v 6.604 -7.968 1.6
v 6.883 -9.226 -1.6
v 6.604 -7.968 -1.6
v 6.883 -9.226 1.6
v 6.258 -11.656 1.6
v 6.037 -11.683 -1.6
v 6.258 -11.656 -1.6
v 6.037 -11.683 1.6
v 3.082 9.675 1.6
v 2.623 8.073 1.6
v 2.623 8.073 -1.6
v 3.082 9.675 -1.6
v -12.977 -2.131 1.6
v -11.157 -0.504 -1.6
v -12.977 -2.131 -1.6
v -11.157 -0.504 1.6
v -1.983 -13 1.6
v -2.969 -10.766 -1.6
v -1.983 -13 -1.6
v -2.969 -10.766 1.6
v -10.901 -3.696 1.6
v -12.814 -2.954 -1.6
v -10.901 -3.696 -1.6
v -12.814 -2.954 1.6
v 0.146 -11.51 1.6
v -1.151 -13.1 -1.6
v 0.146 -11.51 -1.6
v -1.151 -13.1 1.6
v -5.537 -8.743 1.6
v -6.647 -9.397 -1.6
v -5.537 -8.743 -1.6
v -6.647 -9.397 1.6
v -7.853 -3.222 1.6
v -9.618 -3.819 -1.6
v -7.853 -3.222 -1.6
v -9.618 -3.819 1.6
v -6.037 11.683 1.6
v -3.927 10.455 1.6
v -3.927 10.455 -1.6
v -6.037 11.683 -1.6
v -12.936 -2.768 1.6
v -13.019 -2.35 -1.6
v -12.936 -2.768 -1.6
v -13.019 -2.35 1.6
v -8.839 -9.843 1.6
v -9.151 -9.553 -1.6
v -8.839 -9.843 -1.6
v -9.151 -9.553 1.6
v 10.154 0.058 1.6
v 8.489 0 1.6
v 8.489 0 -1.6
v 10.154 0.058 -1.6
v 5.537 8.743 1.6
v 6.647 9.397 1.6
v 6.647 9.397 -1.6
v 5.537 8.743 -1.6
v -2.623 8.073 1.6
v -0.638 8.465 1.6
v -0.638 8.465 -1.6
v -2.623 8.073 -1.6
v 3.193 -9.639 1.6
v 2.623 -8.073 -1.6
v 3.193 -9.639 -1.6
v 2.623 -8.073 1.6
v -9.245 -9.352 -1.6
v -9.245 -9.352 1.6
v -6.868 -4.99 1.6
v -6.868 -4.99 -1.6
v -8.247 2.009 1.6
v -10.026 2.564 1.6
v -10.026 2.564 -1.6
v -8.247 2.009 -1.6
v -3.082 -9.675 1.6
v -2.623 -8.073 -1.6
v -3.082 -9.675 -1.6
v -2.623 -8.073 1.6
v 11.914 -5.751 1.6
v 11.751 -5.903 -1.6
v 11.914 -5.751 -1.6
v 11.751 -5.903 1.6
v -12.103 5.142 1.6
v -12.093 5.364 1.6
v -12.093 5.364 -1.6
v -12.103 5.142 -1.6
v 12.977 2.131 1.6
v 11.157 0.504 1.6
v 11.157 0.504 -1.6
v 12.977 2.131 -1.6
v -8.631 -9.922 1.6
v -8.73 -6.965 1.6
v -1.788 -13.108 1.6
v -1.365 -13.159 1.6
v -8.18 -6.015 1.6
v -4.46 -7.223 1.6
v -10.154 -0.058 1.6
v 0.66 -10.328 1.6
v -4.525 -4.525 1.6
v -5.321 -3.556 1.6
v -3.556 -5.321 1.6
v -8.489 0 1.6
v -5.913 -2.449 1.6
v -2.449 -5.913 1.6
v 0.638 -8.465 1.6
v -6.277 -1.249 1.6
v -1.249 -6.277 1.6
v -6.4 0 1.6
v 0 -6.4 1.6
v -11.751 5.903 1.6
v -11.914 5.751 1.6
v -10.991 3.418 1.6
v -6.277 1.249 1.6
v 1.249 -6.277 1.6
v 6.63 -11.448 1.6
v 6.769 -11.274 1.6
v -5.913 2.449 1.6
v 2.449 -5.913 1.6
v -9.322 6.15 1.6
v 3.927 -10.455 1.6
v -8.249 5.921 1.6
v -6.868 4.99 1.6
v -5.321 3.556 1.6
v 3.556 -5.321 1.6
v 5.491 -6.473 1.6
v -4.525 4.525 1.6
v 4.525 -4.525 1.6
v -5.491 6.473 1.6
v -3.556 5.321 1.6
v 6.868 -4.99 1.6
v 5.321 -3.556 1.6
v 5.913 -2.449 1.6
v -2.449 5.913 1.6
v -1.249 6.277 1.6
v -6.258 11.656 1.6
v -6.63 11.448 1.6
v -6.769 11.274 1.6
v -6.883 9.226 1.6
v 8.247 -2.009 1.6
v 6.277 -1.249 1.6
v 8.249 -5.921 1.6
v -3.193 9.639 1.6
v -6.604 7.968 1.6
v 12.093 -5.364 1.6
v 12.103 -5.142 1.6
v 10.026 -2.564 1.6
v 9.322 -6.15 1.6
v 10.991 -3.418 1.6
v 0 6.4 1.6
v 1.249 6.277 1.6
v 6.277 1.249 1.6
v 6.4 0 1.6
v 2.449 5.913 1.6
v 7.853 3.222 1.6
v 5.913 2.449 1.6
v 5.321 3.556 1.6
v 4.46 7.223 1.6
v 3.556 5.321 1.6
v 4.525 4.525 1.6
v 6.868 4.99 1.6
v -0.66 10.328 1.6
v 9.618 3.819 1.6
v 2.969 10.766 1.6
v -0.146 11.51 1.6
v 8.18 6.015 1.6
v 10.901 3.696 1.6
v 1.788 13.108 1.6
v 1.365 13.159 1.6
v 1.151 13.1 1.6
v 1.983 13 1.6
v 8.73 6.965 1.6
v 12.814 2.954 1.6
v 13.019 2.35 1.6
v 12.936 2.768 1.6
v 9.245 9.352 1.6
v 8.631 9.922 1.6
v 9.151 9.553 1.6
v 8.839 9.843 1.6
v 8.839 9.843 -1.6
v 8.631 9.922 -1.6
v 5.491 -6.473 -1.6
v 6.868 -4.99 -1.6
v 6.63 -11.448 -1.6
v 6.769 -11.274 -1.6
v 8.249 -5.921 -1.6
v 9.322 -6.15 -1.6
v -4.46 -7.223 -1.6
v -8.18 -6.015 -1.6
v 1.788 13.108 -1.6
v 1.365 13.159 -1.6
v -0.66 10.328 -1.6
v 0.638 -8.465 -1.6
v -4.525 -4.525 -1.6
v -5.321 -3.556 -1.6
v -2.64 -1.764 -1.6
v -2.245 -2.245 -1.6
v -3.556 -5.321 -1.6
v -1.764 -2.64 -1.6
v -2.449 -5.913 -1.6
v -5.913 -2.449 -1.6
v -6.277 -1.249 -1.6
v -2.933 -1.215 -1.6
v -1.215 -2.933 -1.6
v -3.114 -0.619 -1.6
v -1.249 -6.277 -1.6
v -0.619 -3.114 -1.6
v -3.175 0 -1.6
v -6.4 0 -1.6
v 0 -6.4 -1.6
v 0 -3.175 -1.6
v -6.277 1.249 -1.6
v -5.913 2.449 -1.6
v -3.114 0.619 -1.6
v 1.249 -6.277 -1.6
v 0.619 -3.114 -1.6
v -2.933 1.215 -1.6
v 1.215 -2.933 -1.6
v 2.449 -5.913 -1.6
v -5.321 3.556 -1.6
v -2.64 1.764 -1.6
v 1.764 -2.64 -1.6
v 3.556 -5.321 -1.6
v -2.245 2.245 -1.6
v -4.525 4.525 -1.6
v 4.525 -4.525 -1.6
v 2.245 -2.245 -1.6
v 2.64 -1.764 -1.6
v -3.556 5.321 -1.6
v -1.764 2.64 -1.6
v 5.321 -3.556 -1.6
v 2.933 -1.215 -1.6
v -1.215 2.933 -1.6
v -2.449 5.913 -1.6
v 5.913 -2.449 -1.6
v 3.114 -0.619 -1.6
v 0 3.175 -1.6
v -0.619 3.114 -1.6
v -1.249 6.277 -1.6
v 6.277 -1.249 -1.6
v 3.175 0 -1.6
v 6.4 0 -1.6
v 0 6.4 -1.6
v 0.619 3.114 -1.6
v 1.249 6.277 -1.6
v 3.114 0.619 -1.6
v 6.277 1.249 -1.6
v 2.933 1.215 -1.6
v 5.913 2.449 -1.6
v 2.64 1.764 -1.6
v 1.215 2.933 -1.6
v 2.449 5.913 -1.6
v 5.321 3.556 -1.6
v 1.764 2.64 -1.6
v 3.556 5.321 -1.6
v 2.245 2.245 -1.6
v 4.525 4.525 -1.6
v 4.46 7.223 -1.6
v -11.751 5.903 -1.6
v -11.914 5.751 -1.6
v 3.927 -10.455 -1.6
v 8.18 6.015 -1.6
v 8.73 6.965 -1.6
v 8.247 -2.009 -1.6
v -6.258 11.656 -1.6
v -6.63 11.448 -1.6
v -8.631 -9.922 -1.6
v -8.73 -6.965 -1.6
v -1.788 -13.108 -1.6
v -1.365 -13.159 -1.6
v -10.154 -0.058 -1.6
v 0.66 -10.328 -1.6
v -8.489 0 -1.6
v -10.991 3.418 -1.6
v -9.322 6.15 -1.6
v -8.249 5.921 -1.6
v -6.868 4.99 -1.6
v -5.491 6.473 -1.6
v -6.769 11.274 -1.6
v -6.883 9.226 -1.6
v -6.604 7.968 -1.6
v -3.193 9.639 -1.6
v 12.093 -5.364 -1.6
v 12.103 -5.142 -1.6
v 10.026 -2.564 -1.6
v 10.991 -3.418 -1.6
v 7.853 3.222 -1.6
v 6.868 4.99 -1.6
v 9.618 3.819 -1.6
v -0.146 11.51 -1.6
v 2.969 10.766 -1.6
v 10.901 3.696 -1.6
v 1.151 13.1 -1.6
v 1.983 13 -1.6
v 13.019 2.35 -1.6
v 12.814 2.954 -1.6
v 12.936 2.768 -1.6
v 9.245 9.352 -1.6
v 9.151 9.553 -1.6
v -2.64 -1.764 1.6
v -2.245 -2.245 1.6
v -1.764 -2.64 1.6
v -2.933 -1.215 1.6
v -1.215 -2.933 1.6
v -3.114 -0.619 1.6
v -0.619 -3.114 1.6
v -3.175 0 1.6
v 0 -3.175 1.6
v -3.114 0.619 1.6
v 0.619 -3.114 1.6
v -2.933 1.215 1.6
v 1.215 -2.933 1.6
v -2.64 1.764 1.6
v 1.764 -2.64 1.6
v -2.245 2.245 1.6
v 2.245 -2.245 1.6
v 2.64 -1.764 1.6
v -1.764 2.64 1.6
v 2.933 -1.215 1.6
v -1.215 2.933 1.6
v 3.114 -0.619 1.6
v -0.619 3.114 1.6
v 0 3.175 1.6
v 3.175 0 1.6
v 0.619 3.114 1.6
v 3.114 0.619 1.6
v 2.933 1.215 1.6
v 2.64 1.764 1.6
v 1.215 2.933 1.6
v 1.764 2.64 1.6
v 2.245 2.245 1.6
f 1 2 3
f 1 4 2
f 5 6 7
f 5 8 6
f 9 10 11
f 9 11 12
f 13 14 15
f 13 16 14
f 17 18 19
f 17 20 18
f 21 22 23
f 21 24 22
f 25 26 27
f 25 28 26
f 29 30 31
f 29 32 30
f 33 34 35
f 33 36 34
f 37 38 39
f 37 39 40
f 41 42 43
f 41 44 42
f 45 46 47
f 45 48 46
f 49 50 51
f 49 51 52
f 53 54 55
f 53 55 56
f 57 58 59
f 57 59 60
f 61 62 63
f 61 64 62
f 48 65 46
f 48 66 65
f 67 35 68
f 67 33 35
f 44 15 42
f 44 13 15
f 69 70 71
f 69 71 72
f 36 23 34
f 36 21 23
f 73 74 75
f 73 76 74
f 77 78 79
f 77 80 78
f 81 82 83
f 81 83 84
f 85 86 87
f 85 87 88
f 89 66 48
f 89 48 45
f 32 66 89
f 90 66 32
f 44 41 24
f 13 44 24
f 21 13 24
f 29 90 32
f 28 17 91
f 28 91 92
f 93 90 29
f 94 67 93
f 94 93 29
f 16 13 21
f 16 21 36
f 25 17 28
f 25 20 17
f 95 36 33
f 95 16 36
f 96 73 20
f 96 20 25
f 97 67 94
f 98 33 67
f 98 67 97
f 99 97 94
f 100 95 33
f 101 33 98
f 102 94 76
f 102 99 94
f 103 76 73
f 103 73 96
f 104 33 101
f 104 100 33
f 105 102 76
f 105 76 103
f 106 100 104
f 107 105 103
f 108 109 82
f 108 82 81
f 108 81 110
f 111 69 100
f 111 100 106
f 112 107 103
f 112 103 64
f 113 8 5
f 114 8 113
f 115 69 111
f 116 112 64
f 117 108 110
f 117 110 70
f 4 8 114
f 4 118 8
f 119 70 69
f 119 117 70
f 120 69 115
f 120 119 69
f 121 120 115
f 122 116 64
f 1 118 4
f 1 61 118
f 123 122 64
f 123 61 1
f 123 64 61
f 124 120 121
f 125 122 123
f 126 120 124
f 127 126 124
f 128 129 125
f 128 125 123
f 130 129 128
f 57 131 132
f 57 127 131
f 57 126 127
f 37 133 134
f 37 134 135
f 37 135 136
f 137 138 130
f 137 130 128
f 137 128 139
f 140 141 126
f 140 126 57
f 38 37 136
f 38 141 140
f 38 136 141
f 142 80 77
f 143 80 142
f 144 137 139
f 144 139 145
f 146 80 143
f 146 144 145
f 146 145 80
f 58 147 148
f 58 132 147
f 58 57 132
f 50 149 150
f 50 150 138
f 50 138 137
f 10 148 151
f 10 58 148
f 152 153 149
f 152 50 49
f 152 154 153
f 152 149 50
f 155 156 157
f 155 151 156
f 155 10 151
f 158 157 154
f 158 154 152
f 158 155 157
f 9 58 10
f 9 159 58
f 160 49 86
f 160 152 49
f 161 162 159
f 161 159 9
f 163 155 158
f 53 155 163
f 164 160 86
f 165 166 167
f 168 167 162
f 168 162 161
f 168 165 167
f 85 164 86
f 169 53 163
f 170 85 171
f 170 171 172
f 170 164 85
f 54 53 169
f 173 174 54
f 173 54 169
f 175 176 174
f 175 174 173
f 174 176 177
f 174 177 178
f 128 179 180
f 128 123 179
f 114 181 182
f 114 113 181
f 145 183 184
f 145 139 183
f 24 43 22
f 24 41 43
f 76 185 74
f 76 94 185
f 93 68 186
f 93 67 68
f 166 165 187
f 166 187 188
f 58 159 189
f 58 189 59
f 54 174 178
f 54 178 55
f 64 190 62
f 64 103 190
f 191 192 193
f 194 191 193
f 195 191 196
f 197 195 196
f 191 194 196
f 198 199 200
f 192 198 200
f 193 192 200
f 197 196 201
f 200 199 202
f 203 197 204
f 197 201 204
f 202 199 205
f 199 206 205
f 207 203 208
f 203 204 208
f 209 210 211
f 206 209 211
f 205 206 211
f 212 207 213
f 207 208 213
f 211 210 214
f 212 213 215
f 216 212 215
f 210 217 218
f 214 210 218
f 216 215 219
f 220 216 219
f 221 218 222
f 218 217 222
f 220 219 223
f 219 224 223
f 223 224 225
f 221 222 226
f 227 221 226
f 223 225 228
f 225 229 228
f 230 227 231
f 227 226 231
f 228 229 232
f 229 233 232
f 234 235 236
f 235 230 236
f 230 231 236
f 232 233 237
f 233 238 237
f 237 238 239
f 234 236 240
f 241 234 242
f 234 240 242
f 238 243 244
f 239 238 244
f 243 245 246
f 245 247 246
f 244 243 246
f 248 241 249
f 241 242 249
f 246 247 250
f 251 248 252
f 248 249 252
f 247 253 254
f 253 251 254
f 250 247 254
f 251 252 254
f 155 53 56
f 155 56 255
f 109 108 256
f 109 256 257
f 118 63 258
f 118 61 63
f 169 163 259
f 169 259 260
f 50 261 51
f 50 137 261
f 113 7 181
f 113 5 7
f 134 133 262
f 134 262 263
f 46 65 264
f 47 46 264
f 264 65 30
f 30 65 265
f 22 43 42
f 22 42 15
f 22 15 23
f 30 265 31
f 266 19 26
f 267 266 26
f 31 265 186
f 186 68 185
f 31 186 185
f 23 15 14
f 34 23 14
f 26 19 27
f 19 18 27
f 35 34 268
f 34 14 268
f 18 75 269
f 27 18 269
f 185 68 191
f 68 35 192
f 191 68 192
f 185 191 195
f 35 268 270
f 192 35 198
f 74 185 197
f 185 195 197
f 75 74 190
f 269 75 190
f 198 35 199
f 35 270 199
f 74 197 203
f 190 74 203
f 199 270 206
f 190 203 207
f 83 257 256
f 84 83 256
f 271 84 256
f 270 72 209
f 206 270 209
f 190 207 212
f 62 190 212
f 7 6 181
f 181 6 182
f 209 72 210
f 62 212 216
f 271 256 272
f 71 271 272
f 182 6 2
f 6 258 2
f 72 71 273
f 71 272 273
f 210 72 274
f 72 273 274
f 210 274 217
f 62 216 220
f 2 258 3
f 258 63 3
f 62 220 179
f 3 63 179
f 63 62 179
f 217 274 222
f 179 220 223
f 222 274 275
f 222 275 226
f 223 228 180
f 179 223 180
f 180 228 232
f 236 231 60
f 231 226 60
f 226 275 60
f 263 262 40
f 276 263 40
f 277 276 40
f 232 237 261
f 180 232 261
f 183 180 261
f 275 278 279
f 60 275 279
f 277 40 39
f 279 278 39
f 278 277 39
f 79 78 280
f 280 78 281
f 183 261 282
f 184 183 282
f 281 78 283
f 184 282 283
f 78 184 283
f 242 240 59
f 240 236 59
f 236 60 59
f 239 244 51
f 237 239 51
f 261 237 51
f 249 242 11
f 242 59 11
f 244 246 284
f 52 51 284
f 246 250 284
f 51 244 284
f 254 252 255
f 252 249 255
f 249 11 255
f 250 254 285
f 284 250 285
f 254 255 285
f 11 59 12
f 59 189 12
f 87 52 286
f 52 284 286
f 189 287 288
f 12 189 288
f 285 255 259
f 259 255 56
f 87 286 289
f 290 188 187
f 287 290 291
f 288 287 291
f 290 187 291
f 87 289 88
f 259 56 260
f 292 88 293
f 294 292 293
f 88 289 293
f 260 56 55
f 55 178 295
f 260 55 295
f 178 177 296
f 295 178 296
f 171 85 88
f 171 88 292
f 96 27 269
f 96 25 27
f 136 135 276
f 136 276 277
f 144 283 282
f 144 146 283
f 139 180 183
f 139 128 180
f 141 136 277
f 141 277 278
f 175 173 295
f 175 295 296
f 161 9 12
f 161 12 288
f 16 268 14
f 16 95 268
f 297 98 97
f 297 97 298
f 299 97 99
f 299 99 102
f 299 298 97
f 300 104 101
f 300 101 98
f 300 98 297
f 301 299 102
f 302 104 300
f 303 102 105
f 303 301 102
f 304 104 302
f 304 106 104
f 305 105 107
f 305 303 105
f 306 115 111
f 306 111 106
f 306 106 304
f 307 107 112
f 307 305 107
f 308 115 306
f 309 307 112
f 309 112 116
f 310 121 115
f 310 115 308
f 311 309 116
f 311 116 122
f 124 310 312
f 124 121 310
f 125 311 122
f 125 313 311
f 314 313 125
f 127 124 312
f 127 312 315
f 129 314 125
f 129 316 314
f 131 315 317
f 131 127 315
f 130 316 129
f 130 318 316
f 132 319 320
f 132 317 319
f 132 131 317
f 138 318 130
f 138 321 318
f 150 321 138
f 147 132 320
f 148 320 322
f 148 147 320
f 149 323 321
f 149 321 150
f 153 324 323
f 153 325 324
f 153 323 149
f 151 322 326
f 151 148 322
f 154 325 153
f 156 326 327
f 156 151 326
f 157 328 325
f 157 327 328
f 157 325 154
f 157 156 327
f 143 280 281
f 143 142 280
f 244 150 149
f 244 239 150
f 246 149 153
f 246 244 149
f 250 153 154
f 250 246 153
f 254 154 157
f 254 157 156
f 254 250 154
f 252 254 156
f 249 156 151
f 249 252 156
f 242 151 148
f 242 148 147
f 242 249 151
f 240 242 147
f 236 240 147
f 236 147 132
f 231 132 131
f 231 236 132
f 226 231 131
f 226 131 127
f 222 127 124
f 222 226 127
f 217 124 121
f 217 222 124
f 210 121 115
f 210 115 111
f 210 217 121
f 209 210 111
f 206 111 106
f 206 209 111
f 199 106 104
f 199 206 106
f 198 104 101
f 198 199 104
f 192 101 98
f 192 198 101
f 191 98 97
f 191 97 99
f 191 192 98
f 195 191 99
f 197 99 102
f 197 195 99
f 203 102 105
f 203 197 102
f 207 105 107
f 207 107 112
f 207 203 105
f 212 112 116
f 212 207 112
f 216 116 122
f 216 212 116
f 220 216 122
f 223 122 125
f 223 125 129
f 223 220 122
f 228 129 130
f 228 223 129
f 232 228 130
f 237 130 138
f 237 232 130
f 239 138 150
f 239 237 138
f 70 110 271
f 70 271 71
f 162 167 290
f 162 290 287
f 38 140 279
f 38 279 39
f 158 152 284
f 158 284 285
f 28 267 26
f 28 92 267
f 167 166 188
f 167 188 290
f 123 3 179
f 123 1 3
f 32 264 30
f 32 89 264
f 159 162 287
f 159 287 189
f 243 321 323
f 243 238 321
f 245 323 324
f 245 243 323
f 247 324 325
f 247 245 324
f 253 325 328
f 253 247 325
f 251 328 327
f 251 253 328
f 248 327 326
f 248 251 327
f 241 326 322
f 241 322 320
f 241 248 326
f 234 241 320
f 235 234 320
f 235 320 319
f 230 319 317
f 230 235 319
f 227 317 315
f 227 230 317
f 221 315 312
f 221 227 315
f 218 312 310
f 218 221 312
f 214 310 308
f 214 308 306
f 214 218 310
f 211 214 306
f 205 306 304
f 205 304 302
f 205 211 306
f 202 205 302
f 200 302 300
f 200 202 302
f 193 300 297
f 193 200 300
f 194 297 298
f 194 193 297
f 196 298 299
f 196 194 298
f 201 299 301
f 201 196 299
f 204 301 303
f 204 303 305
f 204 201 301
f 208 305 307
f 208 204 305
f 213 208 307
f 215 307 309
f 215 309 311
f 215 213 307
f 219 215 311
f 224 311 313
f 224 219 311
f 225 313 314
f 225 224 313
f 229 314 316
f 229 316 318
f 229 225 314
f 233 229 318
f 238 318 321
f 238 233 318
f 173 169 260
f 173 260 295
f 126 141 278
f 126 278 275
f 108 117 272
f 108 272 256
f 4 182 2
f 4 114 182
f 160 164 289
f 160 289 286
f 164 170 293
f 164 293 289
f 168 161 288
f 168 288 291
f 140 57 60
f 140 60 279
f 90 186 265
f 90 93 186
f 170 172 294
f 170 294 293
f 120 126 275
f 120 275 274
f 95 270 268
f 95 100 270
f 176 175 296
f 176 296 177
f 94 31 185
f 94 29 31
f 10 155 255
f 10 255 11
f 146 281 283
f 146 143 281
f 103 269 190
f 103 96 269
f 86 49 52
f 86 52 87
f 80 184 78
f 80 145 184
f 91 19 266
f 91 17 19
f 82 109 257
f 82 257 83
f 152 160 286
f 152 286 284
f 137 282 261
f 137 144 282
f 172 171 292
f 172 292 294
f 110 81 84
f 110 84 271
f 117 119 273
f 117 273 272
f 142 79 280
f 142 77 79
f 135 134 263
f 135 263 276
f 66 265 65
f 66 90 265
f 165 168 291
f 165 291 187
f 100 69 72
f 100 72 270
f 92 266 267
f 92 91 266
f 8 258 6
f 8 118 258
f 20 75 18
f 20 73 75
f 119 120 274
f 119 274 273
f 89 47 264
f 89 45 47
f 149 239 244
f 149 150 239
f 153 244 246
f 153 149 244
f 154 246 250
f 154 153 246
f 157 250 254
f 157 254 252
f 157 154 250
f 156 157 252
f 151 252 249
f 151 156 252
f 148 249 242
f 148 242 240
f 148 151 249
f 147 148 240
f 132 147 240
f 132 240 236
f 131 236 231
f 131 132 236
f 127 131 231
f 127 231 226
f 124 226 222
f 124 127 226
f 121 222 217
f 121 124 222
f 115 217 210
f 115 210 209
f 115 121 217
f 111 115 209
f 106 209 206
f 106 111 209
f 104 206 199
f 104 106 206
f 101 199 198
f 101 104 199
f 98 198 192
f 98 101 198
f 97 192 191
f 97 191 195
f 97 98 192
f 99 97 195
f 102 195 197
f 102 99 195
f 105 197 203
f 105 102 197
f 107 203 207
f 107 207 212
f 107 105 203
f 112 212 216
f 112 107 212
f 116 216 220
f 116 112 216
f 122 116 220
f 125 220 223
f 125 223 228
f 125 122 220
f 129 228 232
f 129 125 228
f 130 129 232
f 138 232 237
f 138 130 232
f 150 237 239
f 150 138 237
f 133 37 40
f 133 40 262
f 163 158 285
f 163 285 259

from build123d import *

# Parameters (mm, degrees)
F0_R     = 6.4
F1_DEPTH = 1.6
F2_R     = 6.4
F2_R_2   = 3.175
F3_DEPTH = 1.6


with BuildPart() as f1:
    # F0 (on Top) → F1 (new body, symmetric)
    with BuildSketch(Plane.XY):
        Polygon((8.247477, -2.009317), (8.488715, 0), (10.153606, 0.058349), (11.15695, 0.503572), (12.976533, 2.131298), (13.018841, 2.349597), (12.936343, 2.768), (12.814343, 2.953887), (10.901054, 3.695576), (9.618406, 3.818704), (7.853398, 3.222175), (6.867516, 4.989538), (8.18014, 6.015345), (8.730165, 6.965288), (9.245486, 9.351671), (9.151408, 9.553142), (8.838732, 9.843152), (8.630761, 9.92183), (6.646933, 9.397267), (5.536882, 8.742953), (4.459578, 7.222904), (2.623158, 8.073248), (3.08214, 9.674683), (2.968757, 10.766495), (1.982981, 13.000019), (1.788442, 13.107723), (1.365029, 13.158558), (1.150532, 13.099962), (-0.146094, 11.509516), (-0.659553, 10.327693), (-0.637637, 8.464735), (-2.623159, 8.073248), (-3.193133, 9.63862), (-3.926611, 10.455274), (-6.036954, 11.68281), (-6.257643, 11.655592), (-6.63007, 11.447842), (-6.769171, 11.274362), (-6.883312, 9.225527), (-6.604053, 7.967609), (-5.491304, 6.473313), (-6.867516, 4.989538), (-8.24873, 5.920934), (-9.322153, 6.150486), (-11.750984, 5.903154), (-11.913527, 5.751424), (-12.092711, 5.364435), (-12.103276, 5.142335), (-10.991347, 3.417693), (-10.026033, 2.564165), (-8.247477, 2.009316), (-8.488715, 0), (-10.153606, -0.05835), (-11.15695, -0.503573), (-12.976534, -2.131299), (-13.018841, -2.349597), (-12.936343, -2.768001), (-12.814344, -2.953888), (-10.901054, -3.695577), (-9.618407, -3.818705), (-7.853398, -3.222176), (-6.867516, -4.989539), (-8.18014, -6.015346), (-8.730165, -6.965289), (-9.245486, -9.351672), (-9.151408, -9.553143), (-8.838732, -9.843153), (-8.630762, -9.921831), (-6.646933, -9.397268), (-5.536883, -8.742954), (-4.459579, -7.222905), (-2.623159, -8.073249), (-3.08214, -9.674684), (-2.968757, -10.766496), (-1.982982, -13.00002), (-1.788442, -13.107723), (-1.36503, -13.158559), (-1.150532, -13.099963), (0.146094, -11.509517), (0.659553, -10.327694), (0.637637, -8.464736), (2.623158, -8.073249), (3.193133, -9.638621), (3.926611, -10.455275), (6.036954, -11.68281), (6.257642, -11.655593), (6.63007, -11.447843), (6.76917, -11.274363), (6.883311, -9.225527), (6.604053, -7.96761), (5.491303, -6.473314), (6.867516, -4.989539), (8.248729, -5.920935), (9.322152, -6.150487), (11.750984, -5.903155), (11.913526, -5.751425), (12.09271, -5.364436), (12.103276, -5.142336), (10.991347, -3.417694), (10.026032, -2.564166), align=None)
        Circle(F0_R, mode=Mode.SUBTRACT)
    extrude(amount=F1_DEPTH, both=True)


with BuildPart() as f3:
    # F2 (on Top) → F3 (new body, symmetric)
    with BuildSketch(Plane.XY):
        Circle(F2_R)
        Circle(F2_R_2, mode=Mode.SUBTRACT)
    extrude(amount=F3_DEPTH, both=True)


solid = Compound([f1.part, f3.part])
